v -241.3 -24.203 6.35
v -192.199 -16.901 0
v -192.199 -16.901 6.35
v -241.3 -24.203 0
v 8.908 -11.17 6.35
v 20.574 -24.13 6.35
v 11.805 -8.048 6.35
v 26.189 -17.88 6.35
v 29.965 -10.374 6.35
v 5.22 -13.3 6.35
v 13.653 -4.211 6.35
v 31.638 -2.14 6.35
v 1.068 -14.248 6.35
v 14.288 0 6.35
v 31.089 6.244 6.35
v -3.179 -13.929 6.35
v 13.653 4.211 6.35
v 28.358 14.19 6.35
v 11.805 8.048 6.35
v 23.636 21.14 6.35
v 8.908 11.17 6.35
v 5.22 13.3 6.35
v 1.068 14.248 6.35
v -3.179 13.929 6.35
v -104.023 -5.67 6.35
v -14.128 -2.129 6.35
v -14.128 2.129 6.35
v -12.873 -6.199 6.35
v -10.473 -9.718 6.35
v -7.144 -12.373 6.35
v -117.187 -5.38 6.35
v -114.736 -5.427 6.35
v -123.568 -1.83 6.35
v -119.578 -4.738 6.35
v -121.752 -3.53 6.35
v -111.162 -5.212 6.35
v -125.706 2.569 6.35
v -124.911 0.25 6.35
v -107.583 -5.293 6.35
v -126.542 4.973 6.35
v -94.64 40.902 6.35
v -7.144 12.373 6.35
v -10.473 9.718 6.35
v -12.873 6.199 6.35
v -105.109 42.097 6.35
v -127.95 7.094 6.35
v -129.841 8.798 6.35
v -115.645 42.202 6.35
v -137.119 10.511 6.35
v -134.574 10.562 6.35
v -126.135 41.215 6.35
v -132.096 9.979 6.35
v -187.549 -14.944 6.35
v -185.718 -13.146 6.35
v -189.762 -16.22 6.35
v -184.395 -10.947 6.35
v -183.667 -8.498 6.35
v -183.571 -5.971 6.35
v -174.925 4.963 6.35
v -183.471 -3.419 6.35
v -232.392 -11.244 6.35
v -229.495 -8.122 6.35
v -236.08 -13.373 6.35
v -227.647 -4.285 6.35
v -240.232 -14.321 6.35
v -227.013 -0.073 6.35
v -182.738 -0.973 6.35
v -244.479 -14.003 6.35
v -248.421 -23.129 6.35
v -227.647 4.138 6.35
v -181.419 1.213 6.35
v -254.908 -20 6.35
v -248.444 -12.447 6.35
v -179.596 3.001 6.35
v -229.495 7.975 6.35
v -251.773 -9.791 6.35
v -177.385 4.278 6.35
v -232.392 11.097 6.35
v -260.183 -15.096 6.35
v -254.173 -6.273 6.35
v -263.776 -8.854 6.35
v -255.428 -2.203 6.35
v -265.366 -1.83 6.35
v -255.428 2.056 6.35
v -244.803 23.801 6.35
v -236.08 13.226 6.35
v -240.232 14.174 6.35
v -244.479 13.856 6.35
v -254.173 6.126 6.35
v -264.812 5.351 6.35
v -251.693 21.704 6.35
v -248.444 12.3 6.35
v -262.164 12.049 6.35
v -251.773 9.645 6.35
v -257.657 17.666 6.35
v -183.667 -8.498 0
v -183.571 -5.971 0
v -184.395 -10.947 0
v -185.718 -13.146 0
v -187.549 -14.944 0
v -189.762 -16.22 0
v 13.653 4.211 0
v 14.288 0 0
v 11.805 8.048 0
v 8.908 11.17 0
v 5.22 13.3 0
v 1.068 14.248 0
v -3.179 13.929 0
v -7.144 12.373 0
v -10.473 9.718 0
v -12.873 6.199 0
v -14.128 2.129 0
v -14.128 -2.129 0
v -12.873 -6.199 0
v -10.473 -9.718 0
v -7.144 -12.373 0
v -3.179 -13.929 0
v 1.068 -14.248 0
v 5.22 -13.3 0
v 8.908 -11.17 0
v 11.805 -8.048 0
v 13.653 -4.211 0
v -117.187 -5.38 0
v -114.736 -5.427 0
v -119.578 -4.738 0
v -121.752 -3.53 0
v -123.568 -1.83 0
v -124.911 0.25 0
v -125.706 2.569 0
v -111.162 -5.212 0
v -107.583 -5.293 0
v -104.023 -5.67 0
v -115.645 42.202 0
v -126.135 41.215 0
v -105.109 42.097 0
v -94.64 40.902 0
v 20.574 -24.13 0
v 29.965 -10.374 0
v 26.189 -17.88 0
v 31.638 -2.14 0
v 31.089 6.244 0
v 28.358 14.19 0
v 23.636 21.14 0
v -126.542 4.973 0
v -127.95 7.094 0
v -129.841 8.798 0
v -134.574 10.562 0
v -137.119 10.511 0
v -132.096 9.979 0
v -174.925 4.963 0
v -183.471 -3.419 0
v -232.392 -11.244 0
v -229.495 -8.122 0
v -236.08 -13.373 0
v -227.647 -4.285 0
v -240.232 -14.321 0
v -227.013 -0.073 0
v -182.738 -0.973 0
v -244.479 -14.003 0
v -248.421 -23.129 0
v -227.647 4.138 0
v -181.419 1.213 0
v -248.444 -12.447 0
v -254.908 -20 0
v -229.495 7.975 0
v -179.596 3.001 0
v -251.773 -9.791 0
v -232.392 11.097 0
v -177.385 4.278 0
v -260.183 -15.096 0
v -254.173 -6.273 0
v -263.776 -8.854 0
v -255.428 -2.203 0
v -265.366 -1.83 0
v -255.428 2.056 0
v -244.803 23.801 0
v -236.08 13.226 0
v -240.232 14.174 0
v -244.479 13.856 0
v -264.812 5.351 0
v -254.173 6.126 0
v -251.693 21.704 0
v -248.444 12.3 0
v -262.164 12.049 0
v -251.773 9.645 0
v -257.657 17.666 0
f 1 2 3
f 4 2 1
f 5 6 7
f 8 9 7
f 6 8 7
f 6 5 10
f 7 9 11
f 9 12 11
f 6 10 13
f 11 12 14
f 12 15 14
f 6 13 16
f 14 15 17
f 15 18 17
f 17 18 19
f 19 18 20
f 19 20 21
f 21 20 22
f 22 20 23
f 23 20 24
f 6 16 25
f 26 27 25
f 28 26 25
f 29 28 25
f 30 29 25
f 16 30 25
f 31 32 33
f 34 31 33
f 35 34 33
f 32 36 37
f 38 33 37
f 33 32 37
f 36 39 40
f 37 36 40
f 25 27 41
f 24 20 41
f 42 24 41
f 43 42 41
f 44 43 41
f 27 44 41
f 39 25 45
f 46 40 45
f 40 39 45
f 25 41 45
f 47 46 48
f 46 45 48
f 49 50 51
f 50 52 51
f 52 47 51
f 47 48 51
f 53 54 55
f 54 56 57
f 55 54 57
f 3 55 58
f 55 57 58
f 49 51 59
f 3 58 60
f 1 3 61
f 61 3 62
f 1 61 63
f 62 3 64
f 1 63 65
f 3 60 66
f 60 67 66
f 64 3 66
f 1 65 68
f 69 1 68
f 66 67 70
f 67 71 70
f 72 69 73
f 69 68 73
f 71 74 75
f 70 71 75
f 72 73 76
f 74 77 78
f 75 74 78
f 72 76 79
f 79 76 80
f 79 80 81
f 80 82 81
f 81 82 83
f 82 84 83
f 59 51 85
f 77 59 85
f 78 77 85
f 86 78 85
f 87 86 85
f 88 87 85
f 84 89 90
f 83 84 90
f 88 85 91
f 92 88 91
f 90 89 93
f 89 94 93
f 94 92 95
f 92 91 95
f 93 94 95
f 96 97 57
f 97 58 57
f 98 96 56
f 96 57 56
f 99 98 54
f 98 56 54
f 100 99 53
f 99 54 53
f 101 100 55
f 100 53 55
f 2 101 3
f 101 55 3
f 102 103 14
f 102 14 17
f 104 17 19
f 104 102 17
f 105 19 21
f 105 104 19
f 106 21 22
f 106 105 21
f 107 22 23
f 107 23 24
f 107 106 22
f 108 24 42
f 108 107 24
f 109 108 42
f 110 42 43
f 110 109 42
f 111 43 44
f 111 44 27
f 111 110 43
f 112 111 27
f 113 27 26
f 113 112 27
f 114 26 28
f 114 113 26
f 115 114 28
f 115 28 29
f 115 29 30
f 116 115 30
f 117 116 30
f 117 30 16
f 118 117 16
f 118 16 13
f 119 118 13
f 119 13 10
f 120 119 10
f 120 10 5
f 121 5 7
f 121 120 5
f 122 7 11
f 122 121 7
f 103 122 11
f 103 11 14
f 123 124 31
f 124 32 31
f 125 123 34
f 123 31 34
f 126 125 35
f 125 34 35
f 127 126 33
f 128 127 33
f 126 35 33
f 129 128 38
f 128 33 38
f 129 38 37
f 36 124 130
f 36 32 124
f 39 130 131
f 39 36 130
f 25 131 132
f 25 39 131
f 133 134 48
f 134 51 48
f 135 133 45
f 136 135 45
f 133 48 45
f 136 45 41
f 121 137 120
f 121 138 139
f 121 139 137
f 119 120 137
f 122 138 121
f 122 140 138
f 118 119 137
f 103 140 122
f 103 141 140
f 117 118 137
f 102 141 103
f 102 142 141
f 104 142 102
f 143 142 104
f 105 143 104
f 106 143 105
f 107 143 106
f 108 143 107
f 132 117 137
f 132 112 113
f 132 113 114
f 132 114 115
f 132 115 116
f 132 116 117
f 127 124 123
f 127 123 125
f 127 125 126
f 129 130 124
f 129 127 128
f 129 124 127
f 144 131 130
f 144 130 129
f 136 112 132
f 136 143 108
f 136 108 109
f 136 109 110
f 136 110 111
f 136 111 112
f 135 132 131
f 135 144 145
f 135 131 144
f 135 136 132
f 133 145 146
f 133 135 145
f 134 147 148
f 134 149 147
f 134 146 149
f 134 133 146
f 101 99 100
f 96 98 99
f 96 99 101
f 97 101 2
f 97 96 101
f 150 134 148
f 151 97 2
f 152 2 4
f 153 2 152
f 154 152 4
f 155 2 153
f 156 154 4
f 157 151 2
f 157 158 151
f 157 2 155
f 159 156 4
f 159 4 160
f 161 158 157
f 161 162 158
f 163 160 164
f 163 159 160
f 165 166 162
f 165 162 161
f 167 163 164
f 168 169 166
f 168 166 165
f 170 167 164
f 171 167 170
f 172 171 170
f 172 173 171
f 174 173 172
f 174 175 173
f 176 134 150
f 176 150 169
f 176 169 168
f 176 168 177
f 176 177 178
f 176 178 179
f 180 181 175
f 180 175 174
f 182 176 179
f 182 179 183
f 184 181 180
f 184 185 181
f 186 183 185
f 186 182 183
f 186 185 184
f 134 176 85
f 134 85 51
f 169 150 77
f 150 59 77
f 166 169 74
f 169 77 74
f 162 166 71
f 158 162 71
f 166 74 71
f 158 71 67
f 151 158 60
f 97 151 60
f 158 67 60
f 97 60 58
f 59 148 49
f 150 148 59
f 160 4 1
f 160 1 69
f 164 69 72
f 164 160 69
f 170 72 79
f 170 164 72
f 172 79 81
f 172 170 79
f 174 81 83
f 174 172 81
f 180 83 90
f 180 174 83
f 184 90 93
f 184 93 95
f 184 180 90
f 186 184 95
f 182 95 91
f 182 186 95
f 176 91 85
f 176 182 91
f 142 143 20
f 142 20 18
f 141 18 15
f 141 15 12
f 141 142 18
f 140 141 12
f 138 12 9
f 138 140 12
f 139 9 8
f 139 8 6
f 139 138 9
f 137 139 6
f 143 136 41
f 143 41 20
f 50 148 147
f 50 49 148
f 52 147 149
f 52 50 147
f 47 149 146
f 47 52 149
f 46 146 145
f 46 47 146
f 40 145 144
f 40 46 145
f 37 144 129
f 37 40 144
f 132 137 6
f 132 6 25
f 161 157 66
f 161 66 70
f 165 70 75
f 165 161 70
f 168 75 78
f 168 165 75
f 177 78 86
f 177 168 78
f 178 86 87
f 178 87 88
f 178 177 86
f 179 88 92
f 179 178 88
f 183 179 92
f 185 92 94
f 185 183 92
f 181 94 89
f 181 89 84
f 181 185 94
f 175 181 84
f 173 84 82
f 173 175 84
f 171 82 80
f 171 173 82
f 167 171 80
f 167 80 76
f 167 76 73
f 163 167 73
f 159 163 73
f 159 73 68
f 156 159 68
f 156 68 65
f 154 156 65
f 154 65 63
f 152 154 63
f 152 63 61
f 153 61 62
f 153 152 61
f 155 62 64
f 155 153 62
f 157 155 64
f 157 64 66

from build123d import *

# Parameters (mm, degrees)
SKETCH1_R           = 14.2875
BOSS_EXTRUDE1_DEPTH = 6.35
FILLET2_R           = 101.6
FILLET4_R           = 10.16
FILLET5_R           = 10.16
FILLET6_R           = 10.16
FILLET7_R           = 43.18
FILLET8_R           = 10.16


with BuildPart() as part:
    # Sketch1 → Boss-Extrude1 (new body)
    with BuildSketch(Plane.XY):
        with BuildLine():
            Line((-244.803394078, 23.800923648), (-110.363, 43.529137522))
            Line((-110.363, 43.529137522), (23.636021604, 21.139651339))
            ThreePointArc((23.636021604, 21.139651339), (31.638059922, -2.139986064), (20.574, -24.13))
            Line((20.574, -24.13), (-110.363, -4.730862478))
            Line((-110.363, -4.730862478), (-124.309464555, -6.804936239))
            Line((-124.309464555, -6.804936239), (-127.066874452, 11.985780223))
            Line((-127.066874452, 11.985780223), (-184.996538861, 3.484995791))
            Line((-184.996538861, 3.484995791), (-182.186210881, -15.412181497))
            Line((-182.186210881, -15.412181497), (-241.3, -24.203395818))
            ThreePointArc((-241.3, -24.203395818), (-265.365994979, -1.829751605), (-244.803394078, 23.800923648))
        make_face()
        with Locations((-241.3, -0.073395818)):
            Circle(SKETCH1_R, mode=Mode.SUBTRACT)
        Circle(SKETCH1_R, mode=Mode.SUBTRACT)
    extrude(amount=BOSS_EXTRUDE1_DEPTH)

    # Fillet2
    fillet2_edges = [part.edges().sort_by_distance(p)[0] for p in [
        (-110.363, 43.529137522, 3.175),
    ]]
    fillet(fillet2_edges, radius=FILLET2_R)

    # Fillet4
    fillet4_edges = [part.edges().sort_by_distance(p)[0] for p in [
        (-127.066874452, 11.985780223, 3.175),
    ]]
    fillet(fillet4_edges, radius=FILLET4_R)

    # Fillet5
    fillet5_edges = [part.edges().sort_by_distance(p)[0] for p in [
        (-184.996538861, 3.484995791, 3.175),
    ]]
    fillet(fillet5_edges, radius=FILLET5_R)

    # Fillet6
    fillet6_edges = [part.edges().sort_by_distance(p)[0] for p in [
        (-182.186210881, -15.412181497, 3.175),
    ]]
    fillet(fillet6_edges, radius=FILLET6_R)

    # Fillet7
    fillet7_edges = [part.edges().sort_by_distance(p)[0] for p in [
        (-110.363, -4.730862478, 3.175),
    ]]
    fillet(fillet7_edges, radius=FILLET7_R)

    # Fillet8
    fillet8_edges = [part.edges().sort_by_distance(p)[0] for p in [
        (-124.309464555, -6.804936239, 3.175),
    ]]
    fillet(fillet8_edges, radius=FILLET8_R)


solid = part.part
